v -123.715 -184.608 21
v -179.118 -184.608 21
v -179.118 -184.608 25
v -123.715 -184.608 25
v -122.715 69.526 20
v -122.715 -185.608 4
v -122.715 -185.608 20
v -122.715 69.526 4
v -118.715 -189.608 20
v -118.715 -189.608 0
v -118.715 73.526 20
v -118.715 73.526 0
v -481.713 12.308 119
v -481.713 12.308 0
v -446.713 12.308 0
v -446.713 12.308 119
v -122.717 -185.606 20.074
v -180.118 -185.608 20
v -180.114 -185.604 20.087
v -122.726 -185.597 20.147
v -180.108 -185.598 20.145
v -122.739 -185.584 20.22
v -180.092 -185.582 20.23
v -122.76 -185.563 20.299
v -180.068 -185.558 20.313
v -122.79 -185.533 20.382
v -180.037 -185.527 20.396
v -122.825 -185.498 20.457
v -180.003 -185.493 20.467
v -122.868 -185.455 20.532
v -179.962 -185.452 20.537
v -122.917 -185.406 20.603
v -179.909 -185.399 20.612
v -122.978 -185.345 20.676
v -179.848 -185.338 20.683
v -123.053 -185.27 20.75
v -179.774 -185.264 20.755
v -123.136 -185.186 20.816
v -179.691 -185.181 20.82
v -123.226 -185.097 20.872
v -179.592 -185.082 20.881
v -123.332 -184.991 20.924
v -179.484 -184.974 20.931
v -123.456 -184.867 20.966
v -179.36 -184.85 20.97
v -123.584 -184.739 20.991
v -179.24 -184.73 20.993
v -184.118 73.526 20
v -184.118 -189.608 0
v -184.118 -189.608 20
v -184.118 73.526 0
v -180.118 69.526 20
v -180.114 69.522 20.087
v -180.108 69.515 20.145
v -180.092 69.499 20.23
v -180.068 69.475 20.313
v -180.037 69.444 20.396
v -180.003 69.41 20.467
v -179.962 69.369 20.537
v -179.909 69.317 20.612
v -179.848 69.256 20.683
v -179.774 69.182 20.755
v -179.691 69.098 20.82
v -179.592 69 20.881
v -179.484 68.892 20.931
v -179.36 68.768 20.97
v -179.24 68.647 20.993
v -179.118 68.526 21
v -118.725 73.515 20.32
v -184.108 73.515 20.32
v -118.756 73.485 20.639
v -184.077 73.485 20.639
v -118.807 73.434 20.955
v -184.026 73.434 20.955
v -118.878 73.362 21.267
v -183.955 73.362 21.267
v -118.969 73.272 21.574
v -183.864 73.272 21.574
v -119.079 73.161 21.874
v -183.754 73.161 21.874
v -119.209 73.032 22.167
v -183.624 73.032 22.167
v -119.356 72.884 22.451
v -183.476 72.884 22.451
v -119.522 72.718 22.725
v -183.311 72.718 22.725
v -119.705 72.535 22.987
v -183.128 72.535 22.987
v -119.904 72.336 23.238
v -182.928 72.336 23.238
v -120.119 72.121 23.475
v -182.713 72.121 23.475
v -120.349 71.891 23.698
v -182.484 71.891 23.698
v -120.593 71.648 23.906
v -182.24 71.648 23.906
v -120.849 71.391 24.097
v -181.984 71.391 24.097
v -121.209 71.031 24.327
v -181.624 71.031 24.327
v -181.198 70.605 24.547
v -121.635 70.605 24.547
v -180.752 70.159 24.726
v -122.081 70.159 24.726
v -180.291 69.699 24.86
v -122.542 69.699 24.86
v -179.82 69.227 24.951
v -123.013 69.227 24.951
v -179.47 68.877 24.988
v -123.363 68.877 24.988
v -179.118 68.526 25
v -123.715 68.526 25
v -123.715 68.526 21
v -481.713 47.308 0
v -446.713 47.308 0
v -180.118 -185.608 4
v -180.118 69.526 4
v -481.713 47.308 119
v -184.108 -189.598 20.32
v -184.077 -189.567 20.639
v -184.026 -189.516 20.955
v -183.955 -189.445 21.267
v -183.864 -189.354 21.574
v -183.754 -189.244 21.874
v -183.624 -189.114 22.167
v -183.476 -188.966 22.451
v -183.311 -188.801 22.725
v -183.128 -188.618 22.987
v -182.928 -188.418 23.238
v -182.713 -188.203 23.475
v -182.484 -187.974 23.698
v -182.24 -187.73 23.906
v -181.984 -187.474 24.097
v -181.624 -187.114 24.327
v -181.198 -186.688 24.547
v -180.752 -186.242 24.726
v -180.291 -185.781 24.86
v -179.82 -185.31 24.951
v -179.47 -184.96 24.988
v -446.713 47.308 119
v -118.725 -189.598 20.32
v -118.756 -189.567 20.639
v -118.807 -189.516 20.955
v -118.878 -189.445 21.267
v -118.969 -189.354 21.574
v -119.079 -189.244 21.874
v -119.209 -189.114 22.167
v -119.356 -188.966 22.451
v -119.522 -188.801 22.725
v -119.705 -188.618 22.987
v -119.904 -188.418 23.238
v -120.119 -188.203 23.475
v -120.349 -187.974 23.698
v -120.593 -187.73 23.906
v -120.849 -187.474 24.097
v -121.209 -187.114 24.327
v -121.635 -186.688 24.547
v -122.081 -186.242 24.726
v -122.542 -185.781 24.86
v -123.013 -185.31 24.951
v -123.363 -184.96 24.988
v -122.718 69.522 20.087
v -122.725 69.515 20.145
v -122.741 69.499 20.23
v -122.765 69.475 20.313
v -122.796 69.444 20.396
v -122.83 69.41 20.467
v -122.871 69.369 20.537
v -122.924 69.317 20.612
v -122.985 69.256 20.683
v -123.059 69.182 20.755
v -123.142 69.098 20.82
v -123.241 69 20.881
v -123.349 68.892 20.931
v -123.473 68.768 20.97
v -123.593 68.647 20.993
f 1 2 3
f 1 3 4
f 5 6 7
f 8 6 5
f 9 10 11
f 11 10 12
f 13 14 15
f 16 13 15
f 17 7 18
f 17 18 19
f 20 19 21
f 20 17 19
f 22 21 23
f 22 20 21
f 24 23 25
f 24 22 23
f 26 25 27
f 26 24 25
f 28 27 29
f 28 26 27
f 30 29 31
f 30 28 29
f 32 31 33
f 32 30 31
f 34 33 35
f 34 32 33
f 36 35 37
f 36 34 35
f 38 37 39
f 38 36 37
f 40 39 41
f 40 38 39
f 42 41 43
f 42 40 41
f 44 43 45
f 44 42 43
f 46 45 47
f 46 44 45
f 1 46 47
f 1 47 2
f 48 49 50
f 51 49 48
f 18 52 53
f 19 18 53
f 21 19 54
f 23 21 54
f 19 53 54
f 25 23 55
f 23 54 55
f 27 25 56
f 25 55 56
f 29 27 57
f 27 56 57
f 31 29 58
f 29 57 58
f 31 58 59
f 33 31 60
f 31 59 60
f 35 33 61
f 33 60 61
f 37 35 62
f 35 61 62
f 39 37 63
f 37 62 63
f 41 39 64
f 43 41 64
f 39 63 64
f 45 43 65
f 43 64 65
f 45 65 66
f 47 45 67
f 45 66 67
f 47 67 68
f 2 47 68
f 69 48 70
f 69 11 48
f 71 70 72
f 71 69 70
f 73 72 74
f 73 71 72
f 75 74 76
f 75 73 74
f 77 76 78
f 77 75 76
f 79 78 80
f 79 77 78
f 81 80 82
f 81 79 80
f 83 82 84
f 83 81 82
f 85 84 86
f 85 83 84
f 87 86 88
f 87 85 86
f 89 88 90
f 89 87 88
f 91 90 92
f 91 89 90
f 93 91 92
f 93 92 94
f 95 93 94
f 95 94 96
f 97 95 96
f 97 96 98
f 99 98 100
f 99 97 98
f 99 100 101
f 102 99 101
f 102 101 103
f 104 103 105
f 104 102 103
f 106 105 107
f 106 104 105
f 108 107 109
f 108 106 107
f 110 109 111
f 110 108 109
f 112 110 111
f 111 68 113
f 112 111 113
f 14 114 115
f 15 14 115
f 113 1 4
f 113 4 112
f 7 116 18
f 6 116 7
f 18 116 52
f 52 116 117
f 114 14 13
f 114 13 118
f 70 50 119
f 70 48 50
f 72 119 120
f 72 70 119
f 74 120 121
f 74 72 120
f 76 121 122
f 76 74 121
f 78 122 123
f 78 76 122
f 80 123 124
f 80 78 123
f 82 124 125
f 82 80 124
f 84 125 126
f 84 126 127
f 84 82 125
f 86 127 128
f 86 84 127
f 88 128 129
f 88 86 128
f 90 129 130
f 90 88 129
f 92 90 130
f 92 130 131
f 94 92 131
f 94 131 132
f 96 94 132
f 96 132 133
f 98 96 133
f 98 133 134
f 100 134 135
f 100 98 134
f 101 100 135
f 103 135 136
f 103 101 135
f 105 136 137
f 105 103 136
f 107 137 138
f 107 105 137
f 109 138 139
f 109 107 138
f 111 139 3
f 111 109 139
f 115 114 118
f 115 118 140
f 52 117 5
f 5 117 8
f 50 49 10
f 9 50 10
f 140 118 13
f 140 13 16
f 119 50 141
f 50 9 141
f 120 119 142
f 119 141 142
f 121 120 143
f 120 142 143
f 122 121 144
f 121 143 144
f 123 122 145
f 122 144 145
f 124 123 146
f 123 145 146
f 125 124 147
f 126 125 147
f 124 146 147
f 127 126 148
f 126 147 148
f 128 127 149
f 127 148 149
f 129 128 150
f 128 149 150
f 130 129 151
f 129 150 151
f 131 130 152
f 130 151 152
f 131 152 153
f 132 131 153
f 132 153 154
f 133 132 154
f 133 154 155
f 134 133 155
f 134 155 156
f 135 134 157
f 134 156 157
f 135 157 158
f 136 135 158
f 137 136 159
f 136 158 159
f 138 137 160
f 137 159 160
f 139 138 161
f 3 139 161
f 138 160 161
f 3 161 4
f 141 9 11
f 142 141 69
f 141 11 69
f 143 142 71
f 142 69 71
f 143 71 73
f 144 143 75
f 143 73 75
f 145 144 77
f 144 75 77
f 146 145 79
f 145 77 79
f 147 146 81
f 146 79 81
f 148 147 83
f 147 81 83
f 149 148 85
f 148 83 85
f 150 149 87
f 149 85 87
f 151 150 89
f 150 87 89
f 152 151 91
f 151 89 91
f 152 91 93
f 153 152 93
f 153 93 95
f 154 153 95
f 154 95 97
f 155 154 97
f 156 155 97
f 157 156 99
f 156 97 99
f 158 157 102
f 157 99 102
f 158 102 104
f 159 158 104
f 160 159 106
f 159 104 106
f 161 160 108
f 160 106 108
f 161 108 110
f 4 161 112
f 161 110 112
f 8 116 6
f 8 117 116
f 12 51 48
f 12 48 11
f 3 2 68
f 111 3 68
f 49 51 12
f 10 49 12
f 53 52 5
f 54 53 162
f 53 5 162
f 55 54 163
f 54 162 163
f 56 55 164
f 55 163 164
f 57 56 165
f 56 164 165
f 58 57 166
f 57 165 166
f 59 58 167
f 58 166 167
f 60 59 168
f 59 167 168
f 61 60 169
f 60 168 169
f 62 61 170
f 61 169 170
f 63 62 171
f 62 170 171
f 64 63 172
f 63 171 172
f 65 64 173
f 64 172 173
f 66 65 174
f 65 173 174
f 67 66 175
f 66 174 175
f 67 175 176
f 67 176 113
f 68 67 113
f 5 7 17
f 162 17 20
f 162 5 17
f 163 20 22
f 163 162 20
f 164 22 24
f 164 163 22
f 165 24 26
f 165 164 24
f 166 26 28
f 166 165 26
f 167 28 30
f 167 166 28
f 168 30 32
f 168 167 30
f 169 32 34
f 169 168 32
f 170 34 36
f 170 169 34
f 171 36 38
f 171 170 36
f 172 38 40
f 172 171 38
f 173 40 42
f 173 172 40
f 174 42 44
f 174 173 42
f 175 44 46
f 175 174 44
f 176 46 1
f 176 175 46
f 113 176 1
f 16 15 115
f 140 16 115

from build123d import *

# Parameters (mm, degrees)
F0_W     = 65.4036104679
F0_H     = 263.1338536739
F1_DEPTH = 25
F2_R     = 5
F3_T     = -4
F4_W     = 35
F4_H     = 35
F5_DEPTH = 119


# Not quite as in the source:
# - a shell that OpenCascade refuses in one call is made with other operations: the cavity is built on its own and cut out


with BuildPart() as f1:
    # F0 (on Top) → F1 (new body)
    with BuildSketch(Plane.XY):
        with Locations((-151.4164656401, -58.0413490534)):
            Rectangle(F0_W, F0_H)
    extrude(amount=F1_DEPTH)

    # F2
    f2_edges = [f1.edges().sort_by_distance(p)[0] for p in [
        (-184.118271, -58.041349, 25),
        (-151.416466, -189.608276, 25),
        (-118.71466, -58.041349, 25),
        (-151.416466, 73.525578, 25),
    ]]
    fillet(f2_edges, radius=F2_R)

    # F3: a shell. OpenCascade refuses it in one call, so the cavity is built on its own and cut out:
    # the body offset inwards by the wall thickness, plus a prism from it out through each open face.
    f3_core = offset(f1.part, amount=F3_T, mode=Mode.PRIVATE)
    f3_exits = [f3_core.faces().sort_by_distance(p)[0] for p in [
        (-151.416466, -58.041349, 21),
    ]]
    add(f3_core, mode=Mode.SUBTRACT)
    extrude(f3_exits, amount=-F3_T, mode=Mode.SUBTRACT)


with BuildPart() as f5:
    # F4 (on Top) → F5 (new body)
    with BuildSketch(Plane.XY):
        with Locations((-464.2132538557, 29.8084301734)):
            Rectangle(F4_W, F4_H)
    extrude(amount=F5_DEPTH)


solid = Compound([f1.part, f5.part])
